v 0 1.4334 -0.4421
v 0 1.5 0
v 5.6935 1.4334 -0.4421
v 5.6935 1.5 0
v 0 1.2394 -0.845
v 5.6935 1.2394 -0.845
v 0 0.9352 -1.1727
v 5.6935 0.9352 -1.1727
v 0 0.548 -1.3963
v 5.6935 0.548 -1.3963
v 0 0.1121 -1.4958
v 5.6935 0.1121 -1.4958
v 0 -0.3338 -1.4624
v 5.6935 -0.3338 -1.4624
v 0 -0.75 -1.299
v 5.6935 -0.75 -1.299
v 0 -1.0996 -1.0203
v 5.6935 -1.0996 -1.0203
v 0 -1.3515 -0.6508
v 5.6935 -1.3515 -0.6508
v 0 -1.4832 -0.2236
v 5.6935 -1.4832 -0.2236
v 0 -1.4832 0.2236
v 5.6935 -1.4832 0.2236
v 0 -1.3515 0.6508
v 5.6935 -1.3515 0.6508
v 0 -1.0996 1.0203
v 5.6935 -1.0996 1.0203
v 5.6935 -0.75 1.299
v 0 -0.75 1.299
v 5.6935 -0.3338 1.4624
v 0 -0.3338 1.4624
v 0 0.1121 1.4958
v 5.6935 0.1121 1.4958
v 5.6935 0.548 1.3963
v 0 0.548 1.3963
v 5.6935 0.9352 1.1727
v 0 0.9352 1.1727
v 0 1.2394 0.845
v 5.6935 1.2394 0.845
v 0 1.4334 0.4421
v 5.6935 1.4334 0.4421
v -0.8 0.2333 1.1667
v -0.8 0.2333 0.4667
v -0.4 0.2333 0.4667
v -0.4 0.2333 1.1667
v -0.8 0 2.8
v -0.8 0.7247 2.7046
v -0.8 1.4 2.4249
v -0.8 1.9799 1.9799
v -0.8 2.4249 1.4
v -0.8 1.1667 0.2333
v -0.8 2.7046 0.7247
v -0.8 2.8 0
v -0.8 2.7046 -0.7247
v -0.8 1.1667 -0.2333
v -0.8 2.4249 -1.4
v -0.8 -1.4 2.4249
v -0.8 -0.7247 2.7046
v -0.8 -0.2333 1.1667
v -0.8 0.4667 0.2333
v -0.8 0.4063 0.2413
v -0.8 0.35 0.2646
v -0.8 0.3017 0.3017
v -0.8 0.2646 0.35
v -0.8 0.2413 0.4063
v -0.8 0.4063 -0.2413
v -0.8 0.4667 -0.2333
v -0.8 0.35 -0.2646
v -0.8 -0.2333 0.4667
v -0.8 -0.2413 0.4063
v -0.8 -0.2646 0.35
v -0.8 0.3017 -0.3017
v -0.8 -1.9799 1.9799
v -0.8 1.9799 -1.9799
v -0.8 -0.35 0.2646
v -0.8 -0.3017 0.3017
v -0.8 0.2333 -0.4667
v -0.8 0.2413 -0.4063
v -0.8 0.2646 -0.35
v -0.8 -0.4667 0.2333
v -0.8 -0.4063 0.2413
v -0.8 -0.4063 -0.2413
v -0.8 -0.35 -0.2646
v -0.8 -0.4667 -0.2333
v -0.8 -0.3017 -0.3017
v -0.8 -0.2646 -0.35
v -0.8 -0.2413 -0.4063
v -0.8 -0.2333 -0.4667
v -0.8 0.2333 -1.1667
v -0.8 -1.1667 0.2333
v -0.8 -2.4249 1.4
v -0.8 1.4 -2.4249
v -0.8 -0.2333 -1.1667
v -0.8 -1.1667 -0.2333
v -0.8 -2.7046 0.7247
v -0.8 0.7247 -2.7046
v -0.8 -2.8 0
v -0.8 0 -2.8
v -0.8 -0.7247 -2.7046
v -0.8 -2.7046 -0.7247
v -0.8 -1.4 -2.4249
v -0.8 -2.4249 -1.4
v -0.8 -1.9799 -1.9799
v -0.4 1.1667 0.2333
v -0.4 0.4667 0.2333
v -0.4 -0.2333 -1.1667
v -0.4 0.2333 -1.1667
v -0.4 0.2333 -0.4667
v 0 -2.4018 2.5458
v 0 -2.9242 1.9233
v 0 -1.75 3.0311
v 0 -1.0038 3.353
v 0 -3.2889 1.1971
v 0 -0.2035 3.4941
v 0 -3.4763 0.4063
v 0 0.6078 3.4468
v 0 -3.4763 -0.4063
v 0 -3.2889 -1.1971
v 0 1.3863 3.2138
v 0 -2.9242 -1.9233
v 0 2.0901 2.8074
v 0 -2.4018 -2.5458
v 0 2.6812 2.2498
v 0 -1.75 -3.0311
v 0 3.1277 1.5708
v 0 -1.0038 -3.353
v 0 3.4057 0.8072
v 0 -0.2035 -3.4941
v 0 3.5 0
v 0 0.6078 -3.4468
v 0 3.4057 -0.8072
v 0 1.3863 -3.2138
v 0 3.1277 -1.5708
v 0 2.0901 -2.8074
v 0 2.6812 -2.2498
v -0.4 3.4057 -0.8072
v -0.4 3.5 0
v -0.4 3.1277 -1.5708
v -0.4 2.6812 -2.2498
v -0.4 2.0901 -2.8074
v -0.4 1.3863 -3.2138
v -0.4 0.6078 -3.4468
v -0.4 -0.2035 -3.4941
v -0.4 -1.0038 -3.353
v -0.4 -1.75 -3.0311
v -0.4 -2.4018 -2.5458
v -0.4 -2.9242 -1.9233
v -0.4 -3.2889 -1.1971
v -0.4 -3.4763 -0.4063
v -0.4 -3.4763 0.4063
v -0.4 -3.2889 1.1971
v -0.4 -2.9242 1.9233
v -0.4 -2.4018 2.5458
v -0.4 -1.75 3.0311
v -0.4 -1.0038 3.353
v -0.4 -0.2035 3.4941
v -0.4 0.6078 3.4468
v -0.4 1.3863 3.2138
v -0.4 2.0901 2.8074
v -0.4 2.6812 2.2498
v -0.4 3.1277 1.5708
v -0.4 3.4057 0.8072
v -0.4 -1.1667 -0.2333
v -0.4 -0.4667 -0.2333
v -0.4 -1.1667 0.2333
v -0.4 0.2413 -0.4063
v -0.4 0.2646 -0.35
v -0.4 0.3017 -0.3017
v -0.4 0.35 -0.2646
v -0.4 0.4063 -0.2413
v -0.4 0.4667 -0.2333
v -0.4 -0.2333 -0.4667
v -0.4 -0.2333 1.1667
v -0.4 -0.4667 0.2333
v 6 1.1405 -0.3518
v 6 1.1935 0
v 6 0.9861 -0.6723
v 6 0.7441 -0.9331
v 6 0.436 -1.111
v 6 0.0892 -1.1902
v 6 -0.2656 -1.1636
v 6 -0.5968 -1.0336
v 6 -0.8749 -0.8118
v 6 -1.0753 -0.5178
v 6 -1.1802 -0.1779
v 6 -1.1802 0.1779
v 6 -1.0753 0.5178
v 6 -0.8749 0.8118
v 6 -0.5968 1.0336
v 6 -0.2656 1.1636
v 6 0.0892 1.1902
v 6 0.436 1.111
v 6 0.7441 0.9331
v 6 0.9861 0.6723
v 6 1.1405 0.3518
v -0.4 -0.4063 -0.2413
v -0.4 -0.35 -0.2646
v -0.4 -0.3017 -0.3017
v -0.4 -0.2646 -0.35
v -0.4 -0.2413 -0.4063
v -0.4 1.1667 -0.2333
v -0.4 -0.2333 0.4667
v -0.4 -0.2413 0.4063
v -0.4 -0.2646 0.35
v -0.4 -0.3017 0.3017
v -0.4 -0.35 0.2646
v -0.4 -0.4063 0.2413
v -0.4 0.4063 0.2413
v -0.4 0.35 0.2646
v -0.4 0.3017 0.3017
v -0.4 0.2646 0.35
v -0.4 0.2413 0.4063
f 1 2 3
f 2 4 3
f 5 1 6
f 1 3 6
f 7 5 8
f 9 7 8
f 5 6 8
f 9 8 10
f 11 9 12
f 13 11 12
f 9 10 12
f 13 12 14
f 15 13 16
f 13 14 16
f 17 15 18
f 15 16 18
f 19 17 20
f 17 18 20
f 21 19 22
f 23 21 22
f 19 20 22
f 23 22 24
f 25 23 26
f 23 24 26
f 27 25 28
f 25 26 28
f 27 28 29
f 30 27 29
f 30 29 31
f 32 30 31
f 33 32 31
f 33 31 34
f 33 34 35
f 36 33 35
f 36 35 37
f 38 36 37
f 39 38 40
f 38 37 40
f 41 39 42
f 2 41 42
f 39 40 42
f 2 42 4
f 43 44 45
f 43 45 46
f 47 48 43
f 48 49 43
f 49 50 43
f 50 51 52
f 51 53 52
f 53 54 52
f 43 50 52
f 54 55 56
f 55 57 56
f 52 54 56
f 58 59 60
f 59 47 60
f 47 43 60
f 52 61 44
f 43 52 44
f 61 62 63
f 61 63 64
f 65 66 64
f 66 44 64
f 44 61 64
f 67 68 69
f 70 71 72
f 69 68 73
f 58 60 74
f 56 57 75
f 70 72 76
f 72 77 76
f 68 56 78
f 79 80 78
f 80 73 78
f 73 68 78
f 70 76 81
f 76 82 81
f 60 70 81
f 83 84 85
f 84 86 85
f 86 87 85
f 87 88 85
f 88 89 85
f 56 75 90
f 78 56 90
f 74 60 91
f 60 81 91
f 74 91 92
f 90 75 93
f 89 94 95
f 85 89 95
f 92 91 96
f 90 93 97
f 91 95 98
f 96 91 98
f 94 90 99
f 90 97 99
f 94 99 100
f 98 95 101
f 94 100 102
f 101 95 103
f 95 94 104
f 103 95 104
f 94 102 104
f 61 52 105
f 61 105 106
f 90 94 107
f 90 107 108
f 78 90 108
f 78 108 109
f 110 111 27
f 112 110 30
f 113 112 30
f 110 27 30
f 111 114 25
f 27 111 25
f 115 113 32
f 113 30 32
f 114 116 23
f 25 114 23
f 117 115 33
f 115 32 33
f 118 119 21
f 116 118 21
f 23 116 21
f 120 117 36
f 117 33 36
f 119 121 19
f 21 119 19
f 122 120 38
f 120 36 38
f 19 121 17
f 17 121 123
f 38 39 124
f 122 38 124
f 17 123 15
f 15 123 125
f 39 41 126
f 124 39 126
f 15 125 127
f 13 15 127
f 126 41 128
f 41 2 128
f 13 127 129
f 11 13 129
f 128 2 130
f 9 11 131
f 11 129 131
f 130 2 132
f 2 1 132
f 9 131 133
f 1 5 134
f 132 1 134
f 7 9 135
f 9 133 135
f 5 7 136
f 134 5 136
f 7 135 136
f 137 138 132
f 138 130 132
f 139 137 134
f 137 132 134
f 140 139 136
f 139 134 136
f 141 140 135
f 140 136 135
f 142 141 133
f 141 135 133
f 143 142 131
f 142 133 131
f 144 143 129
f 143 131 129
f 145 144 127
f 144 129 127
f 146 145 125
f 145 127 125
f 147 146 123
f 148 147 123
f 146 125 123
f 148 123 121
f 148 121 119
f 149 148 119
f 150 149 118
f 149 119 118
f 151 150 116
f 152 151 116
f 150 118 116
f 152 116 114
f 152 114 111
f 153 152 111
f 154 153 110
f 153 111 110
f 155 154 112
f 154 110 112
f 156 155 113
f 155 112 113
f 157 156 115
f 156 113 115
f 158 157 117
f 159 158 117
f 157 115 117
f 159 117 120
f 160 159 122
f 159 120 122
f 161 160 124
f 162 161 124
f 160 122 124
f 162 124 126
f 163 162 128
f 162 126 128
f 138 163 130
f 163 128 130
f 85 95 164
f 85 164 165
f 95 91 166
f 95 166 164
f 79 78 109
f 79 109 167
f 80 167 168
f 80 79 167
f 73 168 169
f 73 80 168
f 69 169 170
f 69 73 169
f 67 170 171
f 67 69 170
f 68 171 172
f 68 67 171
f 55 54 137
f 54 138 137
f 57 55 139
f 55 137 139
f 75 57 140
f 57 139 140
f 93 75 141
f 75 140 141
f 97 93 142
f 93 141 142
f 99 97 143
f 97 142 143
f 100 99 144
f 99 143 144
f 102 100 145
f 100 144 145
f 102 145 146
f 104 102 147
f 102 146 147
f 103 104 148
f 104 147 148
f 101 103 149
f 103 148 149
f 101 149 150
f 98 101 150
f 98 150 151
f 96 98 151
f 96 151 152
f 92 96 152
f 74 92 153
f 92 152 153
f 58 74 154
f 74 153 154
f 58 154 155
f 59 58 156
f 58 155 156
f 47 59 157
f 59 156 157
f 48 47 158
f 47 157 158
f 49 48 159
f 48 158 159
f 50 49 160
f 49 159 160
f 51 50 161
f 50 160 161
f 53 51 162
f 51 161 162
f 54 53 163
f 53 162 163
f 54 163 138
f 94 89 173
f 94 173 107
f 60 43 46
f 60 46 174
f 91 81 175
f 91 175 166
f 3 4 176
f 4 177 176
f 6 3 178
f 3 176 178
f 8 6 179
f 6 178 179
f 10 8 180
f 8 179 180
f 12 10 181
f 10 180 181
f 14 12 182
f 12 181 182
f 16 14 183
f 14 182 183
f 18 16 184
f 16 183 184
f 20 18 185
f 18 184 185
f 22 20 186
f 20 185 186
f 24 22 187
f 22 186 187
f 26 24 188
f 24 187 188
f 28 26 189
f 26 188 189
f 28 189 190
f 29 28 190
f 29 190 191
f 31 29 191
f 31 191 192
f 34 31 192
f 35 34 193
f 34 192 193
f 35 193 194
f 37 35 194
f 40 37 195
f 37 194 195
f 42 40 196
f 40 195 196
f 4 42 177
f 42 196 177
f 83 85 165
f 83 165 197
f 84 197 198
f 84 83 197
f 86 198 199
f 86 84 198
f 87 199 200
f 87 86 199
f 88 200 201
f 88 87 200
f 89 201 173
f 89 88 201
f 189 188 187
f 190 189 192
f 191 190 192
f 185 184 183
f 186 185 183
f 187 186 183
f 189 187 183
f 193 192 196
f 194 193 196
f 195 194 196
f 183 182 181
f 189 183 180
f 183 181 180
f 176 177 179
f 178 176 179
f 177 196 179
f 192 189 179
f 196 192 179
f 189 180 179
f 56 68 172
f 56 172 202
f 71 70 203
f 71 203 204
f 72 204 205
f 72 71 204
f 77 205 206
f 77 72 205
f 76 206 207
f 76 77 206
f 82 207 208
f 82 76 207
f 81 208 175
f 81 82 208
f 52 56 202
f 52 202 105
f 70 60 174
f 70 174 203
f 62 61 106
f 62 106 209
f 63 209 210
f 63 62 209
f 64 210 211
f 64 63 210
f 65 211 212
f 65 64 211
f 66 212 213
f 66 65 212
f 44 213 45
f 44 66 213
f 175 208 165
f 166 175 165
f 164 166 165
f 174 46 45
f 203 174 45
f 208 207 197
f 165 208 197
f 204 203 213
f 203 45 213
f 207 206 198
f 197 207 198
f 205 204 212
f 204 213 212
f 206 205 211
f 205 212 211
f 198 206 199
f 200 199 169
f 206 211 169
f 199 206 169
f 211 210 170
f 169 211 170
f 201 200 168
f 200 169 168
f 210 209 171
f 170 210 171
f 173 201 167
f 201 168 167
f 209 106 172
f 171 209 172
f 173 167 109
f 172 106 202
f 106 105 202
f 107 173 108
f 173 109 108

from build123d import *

# Parameters (mm, degrees)
CUT_EXTRUDE1_DEPTH = 0.4


with BuildPart() as part:
    # Sketch1 → Revolve1 (revolve)
    with BuildSketch(Plane.XY):
        Polygon((-0.8, 0), (-0.8, 2.8), (-0.4, 3.5), (0, 3.5), (0, 1.5), (5.6935, 1.5), (6, 1.1935), (6, 0), align=None)
    revolve(axis=Axis((6, 0, 0), (-1, 0, 0)))

    # Sketch2 → Cut-Extrude1 (cut)
    with BuildSketch(Plane(origin=(-0.8, 0, 0), x_dir=(0, 0, -1), z_dir=(1, 0, 0))):
        with BuildLine():
            Line((-1.166666667, 0.233333357), (-1.166666667, -0.233333333))
            Line((-1.166666667, -0.233333333), (-0.46666669, -0.233333333))
            ThreePointArc((-0.46666669, -0.233333333), (-0.301675108, -0.301675084), (-0.233333357, -0.466666667))
            Line((-0.233333357, -0.466666667), (-0.233333357, -1.166666667))
            Line((-0.233333357, -1.166666667), (0.233333333, -1.166666667))
            Line((0.233333333, -1.166666667), (0.233333333, -0.466666667))
            ThreePointArc((0.233333333, -0.466666667), (0.301675084, -0.301675084), (0.466666667, -0.233333333))
            Line((0.466666667, -0.233333333), (1.166666667, -0.233333333))
            Line((1.166666667, -0.233333333), (1.166666667, 0.233333357))
            Line((1.166666667, 0.233333357), (0.466666667, 0.233333357))
            ThreePointArc((0.466666667, 0.233333357), (0.301675084, 0.301675108), (0.233333333, 0.46666669))
            Line((0.233333333, 0.46666669), (0.233333333, 1.166666667))
            Line((0.233333333, 1.166666667), (-0.233333357, 1.166666667))
            Line((-0.233333357, 1.166666667), (-0.233333357, 0.46666669))
            ThreePointArc((-0.233333357, 0.46666669), (-0.301675108, 0.301675108), (-0.46666669, 0.233333357))
            Line((-0.46666669, 0.233333357), (-1.166666667, 0.233333357))
        make_face()
    extrude(amount=CUT_EXTRUDE1_DEPTH, mode=Mode.SUBTRACT)


solid = part.part
